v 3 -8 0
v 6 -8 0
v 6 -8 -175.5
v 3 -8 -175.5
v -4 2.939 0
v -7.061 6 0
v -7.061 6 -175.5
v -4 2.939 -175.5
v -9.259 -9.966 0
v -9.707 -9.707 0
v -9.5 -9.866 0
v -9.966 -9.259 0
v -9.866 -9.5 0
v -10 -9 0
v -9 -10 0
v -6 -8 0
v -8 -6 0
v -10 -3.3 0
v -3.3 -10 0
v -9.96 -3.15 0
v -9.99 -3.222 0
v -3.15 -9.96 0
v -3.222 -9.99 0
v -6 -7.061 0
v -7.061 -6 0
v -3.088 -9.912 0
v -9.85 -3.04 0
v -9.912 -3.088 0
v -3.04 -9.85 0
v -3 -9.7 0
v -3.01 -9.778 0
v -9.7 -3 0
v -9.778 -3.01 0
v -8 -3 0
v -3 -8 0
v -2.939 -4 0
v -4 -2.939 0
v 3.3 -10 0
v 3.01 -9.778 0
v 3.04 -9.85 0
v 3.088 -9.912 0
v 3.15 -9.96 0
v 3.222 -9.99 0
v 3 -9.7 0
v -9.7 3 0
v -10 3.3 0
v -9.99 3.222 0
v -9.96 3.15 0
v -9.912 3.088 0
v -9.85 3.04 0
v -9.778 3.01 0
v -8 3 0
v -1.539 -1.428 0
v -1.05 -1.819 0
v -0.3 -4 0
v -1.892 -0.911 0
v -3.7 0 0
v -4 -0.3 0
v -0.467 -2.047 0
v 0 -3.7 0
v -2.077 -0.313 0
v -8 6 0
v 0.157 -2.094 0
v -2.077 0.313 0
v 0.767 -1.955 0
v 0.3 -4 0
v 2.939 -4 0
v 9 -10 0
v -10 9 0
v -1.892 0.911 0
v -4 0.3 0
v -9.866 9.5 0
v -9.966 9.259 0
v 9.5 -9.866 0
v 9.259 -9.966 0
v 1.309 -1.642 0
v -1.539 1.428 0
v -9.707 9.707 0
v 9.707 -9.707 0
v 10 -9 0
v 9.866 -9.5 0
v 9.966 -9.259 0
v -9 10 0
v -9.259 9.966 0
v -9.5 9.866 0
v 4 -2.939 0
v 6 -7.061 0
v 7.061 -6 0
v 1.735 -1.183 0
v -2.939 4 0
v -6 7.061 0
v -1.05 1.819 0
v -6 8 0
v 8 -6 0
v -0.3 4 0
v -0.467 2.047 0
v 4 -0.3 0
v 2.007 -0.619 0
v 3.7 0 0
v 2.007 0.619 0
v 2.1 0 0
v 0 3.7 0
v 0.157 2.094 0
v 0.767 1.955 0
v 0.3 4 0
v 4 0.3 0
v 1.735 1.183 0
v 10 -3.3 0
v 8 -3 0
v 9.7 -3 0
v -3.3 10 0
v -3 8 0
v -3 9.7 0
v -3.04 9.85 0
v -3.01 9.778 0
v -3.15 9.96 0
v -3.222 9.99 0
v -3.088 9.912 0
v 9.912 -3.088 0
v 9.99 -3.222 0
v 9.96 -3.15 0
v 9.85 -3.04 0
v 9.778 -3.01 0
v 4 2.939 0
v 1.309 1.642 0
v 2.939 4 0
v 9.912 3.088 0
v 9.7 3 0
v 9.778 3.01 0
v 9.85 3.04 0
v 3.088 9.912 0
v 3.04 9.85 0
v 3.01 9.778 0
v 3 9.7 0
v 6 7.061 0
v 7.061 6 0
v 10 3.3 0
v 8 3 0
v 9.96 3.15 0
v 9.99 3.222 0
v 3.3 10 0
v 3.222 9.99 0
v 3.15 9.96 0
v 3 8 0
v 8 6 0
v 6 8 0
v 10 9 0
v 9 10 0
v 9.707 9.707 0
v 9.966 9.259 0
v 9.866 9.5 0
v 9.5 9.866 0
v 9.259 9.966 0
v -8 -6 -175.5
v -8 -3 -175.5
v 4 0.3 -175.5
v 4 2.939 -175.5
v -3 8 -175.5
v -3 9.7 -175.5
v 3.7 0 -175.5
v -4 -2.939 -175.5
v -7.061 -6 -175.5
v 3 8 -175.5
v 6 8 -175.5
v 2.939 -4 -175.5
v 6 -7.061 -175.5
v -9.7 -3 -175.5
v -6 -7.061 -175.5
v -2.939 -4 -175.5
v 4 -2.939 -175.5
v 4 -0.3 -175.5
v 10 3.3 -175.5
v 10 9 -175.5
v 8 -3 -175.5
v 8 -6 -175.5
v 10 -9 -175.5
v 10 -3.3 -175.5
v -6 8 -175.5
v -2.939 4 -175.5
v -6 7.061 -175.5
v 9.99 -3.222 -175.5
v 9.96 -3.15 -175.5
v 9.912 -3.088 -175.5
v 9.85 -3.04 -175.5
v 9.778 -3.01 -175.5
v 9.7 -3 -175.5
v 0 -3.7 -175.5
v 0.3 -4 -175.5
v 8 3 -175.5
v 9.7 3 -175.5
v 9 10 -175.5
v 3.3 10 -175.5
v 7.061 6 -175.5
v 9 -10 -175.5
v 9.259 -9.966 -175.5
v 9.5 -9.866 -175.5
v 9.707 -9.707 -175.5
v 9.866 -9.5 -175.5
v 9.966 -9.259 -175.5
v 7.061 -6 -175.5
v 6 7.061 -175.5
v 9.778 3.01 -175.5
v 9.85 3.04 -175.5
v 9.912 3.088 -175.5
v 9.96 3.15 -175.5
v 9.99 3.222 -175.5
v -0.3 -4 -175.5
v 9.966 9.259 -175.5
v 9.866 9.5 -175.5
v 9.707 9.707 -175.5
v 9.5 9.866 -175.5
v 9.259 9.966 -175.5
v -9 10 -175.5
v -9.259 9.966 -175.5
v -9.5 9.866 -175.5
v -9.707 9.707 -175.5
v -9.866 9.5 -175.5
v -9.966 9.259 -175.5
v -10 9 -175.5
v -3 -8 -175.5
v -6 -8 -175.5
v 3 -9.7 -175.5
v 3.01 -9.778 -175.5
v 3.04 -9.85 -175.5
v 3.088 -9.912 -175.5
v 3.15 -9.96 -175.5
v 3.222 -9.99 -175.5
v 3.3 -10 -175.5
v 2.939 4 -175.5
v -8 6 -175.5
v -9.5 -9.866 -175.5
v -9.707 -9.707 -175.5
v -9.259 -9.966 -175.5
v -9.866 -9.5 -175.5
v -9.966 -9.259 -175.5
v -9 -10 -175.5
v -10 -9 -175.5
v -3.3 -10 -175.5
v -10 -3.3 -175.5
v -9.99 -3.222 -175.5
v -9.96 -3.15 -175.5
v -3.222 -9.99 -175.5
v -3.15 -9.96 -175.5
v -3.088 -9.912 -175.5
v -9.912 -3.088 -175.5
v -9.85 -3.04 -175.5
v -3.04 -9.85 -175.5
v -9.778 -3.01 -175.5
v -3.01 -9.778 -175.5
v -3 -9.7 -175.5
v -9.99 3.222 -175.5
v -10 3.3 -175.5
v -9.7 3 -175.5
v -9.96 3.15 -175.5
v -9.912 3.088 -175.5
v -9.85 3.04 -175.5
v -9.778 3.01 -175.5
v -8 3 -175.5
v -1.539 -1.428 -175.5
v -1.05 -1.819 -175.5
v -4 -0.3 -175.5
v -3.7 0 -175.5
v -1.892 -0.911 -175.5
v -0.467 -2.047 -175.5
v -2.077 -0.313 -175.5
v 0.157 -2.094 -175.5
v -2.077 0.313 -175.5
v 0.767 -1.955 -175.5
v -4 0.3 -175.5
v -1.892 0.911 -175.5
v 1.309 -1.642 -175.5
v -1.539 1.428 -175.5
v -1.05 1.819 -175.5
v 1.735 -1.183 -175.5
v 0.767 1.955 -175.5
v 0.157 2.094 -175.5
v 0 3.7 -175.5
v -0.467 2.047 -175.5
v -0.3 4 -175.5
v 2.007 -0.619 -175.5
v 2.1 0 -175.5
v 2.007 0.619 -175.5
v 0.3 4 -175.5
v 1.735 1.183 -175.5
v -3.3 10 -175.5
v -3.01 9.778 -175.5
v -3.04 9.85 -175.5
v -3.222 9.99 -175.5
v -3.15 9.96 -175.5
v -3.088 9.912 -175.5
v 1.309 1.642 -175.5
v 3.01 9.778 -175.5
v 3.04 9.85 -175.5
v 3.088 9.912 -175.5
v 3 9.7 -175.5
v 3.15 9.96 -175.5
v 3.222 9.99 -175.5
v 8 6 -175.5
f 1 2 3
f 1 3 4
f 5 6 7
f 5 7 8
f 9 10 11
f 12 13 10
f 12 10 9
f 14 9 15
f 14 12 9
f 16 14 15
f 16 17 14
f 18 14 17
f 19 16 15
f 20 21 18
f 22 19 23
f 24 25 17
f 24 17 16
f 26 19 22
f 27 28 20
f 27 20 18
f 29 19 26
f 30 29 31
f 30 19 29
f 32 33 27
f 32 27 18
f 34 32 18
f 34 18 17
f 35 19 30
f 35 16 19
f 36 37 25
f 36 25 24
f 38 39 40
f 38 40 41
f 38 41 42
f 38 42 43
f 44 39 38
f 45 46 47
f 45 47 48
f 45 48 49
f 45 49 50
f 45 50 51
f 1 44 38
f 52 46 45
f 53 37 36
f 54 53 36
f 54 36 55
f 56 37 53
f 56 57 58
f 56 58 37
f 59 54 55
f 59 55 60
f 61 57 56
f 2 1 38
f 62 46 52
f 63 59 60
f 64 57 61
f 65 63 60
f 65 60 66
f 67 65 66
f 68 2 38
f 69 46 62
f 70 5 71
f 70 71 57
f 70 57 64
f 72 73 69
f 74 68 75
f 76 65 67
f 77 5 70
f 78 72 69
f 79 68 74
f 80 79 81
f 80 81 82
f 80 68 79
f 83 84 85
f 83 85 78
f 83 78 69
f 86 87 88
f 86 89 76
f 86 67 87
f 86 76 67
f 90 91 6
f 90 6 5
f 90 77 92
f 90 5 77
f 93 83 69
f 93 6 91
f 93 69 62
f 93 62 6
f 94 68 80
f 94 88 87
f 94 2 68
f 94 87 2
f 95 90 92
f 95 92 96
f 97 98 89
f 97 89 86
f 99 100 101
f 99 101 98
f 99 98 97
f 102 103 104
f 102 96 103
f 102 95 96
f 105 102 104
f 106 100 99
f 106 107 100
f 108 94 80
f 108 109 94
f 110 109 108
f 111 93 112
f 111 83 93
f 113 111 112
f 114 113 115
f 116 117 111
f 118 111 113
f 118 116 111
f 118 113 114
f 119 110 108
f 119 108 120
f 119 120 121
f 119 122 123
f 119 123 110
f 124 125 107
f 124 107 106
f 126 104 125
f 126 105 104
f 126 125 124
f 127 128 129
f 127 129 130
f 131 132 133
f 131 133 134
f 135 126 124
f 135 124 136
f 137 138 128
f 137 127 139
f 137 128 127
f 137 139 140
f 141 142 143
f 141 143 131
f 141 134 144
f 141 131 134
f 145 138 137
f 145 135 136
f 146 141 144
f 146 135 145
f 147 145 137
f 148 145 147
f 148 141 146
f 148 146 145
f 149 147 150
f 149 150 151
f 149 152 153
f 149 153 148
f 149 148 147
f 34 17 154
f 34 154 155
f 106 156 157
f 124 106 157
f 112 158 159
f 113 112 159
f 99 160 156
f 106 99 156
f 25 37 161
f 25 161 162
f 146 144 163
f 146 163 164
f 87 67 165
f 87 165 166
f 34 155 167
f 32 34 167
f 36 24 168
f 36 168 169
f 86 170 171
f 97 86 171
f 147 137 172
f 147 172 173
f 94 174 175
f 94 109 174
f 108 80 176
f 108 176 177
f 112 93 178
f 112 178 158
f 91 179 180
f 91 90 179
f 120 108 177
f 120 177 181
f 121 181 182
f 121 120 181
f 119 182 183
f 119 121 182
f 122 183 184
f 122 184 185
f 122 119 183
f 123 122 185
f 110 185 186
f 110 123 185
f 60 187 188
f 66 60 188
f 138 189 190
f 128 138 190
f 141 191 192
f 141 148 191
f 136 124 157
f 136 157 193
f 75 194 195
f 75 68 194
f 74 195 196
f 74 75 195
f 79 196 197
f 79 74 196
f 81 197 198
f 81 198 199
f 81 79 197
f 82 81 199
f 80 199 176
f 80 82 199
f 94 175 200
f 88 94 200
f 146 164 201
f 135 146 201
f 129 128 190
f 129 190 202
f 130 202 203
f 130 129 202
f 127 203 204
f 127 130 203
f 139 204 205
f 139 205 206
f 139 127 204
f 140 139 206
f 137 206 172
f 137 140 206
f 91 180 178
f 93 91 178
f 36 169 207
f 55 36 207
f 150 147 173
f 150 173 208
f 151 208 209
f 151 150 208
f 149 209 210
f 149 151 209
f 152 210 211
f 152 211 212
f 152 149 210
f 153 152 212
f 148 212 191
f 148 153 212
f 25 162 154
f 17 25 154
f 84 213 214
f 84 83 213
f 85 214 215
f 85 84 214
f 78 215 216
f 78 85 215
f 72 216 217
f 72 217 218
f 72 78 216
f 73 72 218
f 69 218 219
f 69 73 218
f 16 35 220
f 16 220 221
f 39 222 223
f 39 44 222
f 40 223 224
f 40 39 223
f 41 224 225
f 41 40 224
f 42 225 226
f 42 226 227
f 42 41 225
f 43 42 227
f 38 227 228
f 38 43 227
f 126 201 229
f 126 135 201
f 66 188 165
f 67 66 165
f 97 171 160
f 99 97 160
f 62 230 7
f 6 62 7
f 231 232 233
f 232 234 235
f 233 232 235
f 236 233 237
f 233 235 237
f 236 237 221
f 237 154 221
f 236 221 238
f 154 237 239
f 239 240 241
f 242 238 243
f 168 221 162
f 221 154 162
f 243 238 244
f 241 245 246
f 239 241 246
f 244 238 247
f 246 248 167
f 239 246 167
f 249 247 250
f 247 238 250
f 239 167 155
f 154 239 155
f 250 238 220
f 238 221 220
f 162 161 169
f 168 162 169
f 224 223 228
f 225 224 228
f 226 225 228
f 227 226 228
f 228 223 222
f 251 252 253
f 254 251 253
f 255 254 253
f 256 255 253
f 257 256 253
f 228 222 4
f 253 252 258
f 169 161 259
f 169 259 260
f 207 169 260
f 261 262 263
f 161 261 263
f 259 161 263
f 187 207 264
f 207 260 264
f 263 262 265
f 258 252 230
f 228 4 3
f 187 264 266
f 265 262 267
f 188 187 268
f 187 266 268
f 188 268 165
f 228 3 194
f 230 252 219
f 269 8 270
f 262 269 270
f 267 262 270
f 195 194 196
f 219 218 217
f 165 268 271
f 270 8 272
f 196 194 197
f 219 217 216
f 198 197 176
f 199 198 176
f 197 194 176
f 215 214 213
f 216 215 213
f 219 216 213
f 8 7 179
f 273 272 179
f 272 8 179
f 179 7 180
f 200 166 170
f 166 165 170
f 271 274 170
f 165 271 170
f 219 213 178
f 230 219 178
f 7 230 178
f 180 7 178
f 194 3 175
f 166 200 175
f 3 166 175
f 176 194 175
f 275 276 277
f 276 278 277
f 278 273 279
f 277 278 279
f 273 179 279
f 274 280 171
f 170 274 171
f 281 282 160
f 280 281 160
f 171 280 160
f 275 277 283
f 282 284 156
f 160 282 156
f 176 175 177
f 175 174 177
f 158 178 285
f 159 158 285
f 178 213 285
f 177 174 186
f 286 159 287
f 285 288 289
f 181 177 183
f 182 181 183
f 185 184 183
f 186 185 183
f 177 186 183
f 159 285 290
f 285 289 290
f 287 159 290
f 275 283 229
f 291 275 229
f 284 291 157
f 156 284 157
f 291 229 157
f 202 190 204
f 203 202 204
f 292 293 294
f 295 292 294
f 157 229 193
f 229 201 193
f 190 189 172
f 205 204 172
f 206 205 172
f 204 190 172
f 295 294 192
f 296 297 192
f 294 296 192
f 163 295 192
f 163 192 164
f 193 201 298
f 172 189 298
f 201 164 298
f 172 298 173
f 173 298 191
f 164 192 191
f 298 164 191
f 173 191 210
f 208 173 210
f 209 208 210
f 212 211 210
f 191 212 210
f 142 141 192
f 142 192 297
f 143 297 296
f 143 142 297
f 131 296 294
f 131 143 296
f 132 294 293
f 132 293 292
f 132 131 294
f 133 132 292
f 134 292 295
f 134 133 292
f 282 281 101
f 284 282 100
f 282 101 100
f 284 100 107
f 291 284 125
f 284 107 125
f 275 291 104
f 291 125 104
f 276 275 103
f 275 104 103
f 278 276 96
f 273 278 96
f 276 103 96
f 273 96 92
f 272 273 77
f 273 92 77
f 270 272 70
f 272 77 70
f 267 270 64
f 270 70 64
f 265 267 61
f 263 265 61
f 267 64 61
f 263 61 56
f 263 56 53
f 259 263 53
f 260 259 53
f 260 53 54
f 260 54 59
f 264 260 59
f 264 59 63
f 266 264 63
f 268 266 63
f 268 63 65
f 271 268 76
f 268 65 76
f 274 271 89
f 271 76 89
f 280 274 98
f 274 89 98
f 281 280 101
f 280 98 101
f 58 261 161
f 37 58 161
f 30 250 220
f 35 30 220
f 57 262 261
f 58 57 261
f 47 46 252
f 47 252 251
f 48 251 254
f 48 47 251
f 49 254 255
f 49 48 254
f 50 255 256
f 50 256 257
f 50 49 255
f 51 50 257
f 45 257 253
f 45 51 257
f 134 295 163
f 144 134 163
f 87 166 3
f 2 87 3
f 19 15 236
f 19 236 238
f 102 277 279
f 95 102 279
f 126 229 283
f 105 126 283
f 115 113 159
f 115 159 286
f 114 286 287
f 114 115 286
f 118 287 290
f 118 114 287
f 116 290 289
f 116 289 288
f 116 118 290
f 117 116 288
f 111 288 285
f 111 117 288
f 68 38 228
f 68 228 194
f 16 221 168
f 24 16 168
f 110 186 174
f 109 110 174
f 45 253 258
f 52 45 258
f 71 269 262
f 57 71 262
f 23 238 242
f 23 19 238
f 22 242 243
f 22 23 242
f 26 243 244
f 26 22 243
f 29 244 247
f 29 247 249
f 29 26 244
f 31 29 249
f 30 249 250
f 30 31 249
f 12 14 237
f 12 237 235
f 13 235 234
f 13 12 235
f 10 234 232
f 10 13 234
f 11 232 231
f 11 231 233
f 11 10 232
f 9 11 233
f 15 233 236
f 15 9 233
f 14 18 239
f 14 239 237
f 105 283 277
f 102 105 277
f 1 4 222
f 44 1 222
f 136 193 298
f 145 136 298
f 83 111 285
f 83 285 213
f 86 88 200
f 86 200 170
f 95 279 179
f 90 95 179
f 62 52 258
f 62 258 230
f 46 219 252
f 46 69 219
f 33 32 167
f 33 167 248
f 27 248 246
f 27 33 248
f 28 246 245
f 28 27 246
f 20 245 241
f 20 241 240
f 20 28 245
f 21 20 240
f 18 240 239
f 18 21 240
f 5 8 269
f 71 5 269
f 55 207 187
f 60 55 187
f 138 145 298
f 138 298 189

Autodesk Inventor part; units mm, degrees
ref_plane "YZ Plane" through (0, 0, 0) normal (1, 0, 0) x (0, 1, 0)
ref_plane "XZ Plane" through (0, 0, 0) normal (0, 1, 0) x (-1, 0, 0)
ref_plane "XY Plane" through (0, 0, 0) normal (0, 0, 1) x (1, 0, 0)
sketch "Sketch_5" plane through (0, 0, 0) normal (0, 0, 1) x (1, 0, 0)
  line L0 (-10, 9) -> (-10, 3.3)
  arc A0 (-10, 3.3) -> (-9.7, 3) centre (-9.7, 3.3) ccw
  line L1 (-9.7, 3) -> (-8, 3)
  line L2 (-8, 3) -> (-8, 6)
  line L3 (-8, 6) -> (-7.0607, 6)
  line L4 (-7.0607, 6) -> (-4, 2.9393)
  line L5 (-4, 2.9393) -> (-4, 0.3)
  line L6 (-4, 0.3) -> (-3.7, 0)
  line L7 (-3.7, 0) -> (-4, -0.3)
  line L8 (-4, -0.3) -> (-4, -2.9393)
  line L9 (-4, -2.9393) -> (-7.0607, -6)
  line L10 (-7.0607, -6) -> (-8, -6)
  line L11 (-8, -6) -> (-8, -3)
  line L12 (-8, -3) -> (-9.7, -3)
  arc A1 (-9.7, -3) -> (-10, -3.3) centre (-9.7, -3.3) ccw
  line L13 (-10, -3.3) -> (-10, -9)
  arc A2 (-10, -9) -> (-9, -10) centre (-9, -9) ccw
  line L14 (-9, -10) -> (-3.3, -10)
  arc A3 (-3.3, -10) -> (-3, -9.7) centre (-3.3, -9.7) ccw
  line L15 (-3, -9.7) -> (-3, -8)
  line L16 (-3, -8) -> (-6, -8)
  line L17 (-6, -8) -> (-6, -7.0607)
  line L18 (-6, -7.0607) -> (-2.9393, -4)
  line L19 (-2.9393, -4) -> (-0.3, -4)
  line L20 (-0.3, -4) -> (0, -3.7)
  line L21 (0, -3.7) -> (0.3, -4)
  line L22 (0.3, -4) -> (2.9393, -4)
  line L23 (2.9393, -4) -> (6, -7.0607)
  line L24 (6, -7.0607) -> (6, -8)
  line L25 (6, -8) -> (3, -8)
  line L26 (3, -8) -> (3, -9.7)
  arc A4 (3, -9.7) -> (3.3, -10) centre (3.3, -9.7) ccw
  line L27 (3.3, -10) -> (9, -10)
  arc A5 (9, -10) -> (10, -9) centre (9, -9) ccw
  line L28 (10, -9) -> (10, -3.3)
  arc A6 (10, -3.3) -> (9.7, -3) centre (9.7, -3.3) ccw
  line L29 (9.7, -3) -> (8, -3)
  line L30 (8, -3) -> (8, -6)
  line L31 (8, -6) -> (7.0607, -6)
  line L32 (7.0607, -6) -> (4, -2.9393)
  line L33 (4, -2.9393) -> (4, -0.3)
  line L34 (4, -0.3) -> (3.7, 0)
  line L35 (3.7, 0) -> (4, 0.3)
  line L36 (4, 0.3) -> (4, 2.9393)
  line L37 (4, 2.9393) -> (7.0607, 6)
  line L38 (7.0607, 6) -> (8, 6)
  line L39 (8, 6) -> (8, 3)
  line L40 (8, 3) -> (9.7, 3)
  arc A7 (9.7, 3) -> (10, 3.3) centre (9.7, 3.3) ccw
  line L41 (10, 3.3) -> (10, 9)
  arc A8 (10, 9) -> (9, 10) centre (9, 9) ccw
  line L42 (9, 10) -> (3.3, 10)
  arc A9 (3.3, 10) -> (3, 9.7) centre (3.3, 9.7) ccw
  line L43 (3, 9.7) -> (3, 8)
  line L44 (3, 8) -> (6, 8)
  line L45 (6, 8) -> (6, 7.0607)
  line L46 (6, 7.0607) -> (2.9393, 4)
  line L47 (2.9393, 4) -> (0.3, 4)
  line L48 (0.3, 4) -> (0, 3.7)
  line L49 (0, 3.7) -> (-0.3, 4)
  line L50 (-0.3, 4) -> (-2.9393, 4)
  line L51 (-2.9393, 4) -> (-6, 7.0607)
  line L52 (-6, 7.0607) -> (-6, 8)
  line L53 (-6, 8) -> (-3, 8)
  line L54 (-3, 8) -> (-3, 9.7)
  arc A10 (-3, 9.7) -> (-3.3, 10) centre (-3.3, 9.7) ccw
  line L55 (-3.3, 10) -> (-9, 10)
  arc A11 (-9, 10) -> (-10, 9) centre (-9, 9) ccw
  circle A12 centre (0, 0) radius 2.1
extrude "Extrusion1" add sketch "Sketch_5" against normal blind 175.5
properties part number "KHFS5-2020-4000"
